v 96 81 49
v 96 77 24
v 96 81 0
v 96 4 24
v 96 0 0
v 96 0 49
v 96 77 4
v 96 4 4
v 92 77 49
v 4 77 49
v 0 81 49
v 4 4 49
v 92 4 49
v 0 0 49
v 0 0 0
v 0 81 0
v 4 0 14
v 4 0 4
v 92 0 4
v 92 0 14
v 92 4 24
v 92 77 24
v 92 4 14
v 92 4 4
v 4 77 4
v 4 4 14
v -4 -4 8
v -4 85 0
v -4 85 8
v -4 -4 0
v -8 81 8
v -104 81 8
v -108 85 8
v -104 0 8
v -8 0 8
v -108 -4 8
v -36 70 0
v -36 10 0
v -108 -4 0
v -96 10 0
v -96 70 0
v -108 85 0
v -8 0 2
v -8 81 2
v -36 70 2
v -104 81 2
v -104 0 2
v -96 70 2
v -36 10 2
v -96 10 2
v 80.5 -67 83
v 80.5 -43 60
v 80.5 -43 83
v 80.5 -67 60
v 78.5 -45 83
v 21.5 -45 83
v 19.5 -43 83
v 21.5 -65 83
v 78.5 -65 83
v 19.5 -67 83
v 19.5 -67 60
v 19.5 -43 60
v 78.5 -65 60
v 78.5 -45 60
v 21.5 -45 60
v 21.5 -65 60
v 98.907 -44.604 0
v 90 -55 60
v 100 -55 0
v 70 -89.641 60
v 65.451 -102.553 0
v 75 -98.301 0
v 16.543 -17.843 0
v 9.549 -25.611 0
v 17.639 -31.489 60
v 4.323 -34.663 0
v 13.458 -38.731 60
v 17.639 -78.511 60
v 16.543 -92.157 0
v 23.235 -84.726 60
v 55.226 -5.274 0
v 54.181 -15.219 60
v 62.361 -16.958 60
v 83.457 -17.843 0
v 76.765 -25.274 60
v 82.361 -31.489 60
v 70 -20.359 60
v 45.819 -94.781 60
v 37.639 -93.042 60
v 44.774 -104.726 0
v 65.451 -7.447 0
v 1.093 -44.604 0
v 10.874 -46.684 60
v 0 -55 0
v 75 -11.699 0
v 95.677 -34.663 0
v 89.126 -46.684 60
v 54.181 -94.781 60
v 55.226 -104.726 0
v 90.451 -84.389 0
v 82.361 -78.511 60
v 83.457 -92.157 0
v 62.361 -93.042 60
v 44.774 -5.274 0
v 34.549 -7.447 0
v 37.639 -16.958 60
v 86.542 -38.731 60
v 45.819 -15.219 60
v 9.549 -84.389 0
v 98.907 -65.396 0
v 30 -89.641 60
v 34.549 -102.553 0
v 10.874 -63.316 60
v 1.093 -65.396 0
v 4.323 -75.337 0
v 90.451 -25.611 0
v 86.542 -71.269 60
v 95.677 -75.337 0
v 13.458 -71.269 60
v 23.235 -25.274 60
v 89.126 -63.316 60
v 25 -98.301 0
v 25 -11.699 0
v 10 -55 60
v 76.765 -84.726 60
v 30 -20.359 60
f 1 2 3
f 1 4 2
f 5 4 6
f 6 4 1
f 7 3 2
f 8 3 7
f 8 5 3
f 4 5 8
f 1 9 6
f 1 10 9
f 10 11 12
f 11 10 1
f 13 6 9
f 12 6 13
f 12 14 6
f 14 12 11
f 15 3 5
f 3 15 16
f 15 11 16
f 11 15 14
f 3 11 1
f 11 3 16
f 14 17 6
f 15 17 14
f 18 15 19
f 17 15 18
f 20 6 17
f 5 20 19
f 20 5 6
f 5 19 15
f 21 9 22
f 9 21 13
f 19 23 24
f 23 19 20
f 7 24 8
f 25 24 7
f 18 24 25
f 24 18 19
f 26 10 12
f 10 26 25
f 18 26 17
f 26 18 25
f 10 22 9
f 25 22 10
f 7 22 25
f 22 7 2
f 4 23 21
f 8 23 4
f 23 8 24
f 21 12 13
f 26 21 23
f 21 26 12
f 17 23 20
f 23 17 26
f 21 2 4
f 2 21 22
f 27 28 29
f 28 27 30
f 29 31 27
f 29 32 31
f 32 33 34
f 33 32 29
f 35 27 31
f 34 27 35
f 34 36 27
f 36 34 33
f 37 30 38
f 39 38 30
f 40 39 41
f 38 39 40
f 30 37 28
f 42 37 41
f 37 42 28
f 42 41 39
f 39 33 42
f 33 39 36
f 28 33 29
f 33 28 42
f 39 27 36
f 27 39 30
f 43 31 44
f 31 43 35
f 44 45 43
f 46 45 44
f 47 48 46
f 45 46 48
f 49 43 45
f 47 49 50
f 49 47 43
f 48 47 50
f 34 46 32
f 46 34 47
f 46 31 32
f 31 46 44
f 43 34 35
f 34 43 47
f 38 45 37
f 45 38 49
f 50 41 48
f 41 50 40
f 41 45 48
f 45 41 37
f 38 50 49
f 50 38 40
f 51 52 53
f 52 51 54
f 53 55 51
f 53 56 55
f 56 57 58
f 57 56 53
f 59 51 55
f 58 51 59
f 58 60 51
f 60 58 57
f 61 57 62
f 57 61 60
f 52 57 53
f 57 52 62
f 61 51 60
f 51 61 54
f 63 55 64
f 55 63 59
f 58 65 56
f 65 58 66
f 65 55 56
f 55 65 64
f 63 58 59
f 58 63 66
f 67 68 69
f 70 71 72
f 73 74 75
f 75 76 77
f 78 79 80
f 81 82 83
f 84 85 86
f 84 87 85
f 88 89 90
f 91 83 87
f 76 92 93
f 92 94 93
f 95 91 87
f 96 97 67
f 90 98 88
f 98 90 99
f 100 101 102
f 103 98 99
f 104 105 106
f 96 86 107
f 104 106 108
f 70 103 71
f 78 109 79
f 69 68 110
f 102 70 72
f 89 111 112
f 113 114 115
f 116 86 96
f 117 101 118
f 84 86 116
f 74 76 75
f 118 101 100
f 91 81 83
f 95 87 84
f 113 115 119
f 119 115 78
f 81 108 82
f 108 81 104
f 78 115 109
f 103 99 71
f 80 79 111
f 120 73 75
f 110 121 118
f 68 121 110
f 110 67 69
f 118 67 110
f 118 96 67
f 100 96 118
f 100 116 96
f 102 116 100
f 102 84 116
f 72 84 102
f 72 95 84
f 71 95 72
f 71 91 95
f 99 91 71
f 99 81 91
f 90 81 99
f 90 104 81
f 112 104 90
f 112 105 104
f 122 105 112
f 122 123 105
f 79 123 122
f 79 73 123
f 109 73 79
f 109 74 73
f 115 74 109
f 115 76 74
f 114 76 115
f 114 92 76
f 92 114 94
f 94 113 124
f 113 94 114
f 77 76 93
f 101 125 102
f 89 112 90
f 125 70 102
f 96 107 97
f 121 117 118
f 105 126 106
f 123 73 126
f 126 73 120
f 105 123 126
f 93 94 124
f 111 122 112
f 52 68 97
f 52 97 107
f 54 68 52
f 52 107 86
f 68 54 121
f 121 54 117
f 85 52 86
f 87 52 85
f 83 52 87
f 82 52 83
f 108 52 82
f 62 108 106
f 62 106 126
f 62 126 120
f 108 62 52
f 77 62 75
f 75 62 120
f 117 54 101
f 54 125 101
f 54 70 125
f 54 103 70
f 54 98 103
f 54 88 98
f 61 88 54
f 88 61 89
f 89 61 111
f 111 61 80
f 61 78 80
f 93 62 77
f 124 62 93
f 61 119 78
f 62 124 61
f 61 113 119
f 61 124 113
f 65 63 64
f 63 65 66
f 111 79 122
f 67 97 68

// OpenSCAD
difference(){
    cube([96,81,49]);
    //HOLLOW the case
    translate([4,4,4]){
        cube([88,73,45]);
        }
        //HDMI and POWER
    translate([4,0,4]){
        cube([88,4,10]);
        //USB and LAN
    } translate([92,4,4]){
        cube([4,73,20]);
        }   
}
//the Lid
difference(){
    translate([-108,-4,0]){
        cube([104,89,8]);
        }
     translate([-104,0,2]){
        cube([96,81,6]);
        }   
     translate([-96,10,0]){
        cube([60,60,2]);
        } 
    }
union(){
translate([50,-55,0]){
        cylinder(60,50,40);
    }
difference(){
    translate([50,-55,60]){
        cube([61,24,46],center=true);
    }
    translate([50,-55,64]){
        cube([57,20,42],center=true);
    }
}
}
